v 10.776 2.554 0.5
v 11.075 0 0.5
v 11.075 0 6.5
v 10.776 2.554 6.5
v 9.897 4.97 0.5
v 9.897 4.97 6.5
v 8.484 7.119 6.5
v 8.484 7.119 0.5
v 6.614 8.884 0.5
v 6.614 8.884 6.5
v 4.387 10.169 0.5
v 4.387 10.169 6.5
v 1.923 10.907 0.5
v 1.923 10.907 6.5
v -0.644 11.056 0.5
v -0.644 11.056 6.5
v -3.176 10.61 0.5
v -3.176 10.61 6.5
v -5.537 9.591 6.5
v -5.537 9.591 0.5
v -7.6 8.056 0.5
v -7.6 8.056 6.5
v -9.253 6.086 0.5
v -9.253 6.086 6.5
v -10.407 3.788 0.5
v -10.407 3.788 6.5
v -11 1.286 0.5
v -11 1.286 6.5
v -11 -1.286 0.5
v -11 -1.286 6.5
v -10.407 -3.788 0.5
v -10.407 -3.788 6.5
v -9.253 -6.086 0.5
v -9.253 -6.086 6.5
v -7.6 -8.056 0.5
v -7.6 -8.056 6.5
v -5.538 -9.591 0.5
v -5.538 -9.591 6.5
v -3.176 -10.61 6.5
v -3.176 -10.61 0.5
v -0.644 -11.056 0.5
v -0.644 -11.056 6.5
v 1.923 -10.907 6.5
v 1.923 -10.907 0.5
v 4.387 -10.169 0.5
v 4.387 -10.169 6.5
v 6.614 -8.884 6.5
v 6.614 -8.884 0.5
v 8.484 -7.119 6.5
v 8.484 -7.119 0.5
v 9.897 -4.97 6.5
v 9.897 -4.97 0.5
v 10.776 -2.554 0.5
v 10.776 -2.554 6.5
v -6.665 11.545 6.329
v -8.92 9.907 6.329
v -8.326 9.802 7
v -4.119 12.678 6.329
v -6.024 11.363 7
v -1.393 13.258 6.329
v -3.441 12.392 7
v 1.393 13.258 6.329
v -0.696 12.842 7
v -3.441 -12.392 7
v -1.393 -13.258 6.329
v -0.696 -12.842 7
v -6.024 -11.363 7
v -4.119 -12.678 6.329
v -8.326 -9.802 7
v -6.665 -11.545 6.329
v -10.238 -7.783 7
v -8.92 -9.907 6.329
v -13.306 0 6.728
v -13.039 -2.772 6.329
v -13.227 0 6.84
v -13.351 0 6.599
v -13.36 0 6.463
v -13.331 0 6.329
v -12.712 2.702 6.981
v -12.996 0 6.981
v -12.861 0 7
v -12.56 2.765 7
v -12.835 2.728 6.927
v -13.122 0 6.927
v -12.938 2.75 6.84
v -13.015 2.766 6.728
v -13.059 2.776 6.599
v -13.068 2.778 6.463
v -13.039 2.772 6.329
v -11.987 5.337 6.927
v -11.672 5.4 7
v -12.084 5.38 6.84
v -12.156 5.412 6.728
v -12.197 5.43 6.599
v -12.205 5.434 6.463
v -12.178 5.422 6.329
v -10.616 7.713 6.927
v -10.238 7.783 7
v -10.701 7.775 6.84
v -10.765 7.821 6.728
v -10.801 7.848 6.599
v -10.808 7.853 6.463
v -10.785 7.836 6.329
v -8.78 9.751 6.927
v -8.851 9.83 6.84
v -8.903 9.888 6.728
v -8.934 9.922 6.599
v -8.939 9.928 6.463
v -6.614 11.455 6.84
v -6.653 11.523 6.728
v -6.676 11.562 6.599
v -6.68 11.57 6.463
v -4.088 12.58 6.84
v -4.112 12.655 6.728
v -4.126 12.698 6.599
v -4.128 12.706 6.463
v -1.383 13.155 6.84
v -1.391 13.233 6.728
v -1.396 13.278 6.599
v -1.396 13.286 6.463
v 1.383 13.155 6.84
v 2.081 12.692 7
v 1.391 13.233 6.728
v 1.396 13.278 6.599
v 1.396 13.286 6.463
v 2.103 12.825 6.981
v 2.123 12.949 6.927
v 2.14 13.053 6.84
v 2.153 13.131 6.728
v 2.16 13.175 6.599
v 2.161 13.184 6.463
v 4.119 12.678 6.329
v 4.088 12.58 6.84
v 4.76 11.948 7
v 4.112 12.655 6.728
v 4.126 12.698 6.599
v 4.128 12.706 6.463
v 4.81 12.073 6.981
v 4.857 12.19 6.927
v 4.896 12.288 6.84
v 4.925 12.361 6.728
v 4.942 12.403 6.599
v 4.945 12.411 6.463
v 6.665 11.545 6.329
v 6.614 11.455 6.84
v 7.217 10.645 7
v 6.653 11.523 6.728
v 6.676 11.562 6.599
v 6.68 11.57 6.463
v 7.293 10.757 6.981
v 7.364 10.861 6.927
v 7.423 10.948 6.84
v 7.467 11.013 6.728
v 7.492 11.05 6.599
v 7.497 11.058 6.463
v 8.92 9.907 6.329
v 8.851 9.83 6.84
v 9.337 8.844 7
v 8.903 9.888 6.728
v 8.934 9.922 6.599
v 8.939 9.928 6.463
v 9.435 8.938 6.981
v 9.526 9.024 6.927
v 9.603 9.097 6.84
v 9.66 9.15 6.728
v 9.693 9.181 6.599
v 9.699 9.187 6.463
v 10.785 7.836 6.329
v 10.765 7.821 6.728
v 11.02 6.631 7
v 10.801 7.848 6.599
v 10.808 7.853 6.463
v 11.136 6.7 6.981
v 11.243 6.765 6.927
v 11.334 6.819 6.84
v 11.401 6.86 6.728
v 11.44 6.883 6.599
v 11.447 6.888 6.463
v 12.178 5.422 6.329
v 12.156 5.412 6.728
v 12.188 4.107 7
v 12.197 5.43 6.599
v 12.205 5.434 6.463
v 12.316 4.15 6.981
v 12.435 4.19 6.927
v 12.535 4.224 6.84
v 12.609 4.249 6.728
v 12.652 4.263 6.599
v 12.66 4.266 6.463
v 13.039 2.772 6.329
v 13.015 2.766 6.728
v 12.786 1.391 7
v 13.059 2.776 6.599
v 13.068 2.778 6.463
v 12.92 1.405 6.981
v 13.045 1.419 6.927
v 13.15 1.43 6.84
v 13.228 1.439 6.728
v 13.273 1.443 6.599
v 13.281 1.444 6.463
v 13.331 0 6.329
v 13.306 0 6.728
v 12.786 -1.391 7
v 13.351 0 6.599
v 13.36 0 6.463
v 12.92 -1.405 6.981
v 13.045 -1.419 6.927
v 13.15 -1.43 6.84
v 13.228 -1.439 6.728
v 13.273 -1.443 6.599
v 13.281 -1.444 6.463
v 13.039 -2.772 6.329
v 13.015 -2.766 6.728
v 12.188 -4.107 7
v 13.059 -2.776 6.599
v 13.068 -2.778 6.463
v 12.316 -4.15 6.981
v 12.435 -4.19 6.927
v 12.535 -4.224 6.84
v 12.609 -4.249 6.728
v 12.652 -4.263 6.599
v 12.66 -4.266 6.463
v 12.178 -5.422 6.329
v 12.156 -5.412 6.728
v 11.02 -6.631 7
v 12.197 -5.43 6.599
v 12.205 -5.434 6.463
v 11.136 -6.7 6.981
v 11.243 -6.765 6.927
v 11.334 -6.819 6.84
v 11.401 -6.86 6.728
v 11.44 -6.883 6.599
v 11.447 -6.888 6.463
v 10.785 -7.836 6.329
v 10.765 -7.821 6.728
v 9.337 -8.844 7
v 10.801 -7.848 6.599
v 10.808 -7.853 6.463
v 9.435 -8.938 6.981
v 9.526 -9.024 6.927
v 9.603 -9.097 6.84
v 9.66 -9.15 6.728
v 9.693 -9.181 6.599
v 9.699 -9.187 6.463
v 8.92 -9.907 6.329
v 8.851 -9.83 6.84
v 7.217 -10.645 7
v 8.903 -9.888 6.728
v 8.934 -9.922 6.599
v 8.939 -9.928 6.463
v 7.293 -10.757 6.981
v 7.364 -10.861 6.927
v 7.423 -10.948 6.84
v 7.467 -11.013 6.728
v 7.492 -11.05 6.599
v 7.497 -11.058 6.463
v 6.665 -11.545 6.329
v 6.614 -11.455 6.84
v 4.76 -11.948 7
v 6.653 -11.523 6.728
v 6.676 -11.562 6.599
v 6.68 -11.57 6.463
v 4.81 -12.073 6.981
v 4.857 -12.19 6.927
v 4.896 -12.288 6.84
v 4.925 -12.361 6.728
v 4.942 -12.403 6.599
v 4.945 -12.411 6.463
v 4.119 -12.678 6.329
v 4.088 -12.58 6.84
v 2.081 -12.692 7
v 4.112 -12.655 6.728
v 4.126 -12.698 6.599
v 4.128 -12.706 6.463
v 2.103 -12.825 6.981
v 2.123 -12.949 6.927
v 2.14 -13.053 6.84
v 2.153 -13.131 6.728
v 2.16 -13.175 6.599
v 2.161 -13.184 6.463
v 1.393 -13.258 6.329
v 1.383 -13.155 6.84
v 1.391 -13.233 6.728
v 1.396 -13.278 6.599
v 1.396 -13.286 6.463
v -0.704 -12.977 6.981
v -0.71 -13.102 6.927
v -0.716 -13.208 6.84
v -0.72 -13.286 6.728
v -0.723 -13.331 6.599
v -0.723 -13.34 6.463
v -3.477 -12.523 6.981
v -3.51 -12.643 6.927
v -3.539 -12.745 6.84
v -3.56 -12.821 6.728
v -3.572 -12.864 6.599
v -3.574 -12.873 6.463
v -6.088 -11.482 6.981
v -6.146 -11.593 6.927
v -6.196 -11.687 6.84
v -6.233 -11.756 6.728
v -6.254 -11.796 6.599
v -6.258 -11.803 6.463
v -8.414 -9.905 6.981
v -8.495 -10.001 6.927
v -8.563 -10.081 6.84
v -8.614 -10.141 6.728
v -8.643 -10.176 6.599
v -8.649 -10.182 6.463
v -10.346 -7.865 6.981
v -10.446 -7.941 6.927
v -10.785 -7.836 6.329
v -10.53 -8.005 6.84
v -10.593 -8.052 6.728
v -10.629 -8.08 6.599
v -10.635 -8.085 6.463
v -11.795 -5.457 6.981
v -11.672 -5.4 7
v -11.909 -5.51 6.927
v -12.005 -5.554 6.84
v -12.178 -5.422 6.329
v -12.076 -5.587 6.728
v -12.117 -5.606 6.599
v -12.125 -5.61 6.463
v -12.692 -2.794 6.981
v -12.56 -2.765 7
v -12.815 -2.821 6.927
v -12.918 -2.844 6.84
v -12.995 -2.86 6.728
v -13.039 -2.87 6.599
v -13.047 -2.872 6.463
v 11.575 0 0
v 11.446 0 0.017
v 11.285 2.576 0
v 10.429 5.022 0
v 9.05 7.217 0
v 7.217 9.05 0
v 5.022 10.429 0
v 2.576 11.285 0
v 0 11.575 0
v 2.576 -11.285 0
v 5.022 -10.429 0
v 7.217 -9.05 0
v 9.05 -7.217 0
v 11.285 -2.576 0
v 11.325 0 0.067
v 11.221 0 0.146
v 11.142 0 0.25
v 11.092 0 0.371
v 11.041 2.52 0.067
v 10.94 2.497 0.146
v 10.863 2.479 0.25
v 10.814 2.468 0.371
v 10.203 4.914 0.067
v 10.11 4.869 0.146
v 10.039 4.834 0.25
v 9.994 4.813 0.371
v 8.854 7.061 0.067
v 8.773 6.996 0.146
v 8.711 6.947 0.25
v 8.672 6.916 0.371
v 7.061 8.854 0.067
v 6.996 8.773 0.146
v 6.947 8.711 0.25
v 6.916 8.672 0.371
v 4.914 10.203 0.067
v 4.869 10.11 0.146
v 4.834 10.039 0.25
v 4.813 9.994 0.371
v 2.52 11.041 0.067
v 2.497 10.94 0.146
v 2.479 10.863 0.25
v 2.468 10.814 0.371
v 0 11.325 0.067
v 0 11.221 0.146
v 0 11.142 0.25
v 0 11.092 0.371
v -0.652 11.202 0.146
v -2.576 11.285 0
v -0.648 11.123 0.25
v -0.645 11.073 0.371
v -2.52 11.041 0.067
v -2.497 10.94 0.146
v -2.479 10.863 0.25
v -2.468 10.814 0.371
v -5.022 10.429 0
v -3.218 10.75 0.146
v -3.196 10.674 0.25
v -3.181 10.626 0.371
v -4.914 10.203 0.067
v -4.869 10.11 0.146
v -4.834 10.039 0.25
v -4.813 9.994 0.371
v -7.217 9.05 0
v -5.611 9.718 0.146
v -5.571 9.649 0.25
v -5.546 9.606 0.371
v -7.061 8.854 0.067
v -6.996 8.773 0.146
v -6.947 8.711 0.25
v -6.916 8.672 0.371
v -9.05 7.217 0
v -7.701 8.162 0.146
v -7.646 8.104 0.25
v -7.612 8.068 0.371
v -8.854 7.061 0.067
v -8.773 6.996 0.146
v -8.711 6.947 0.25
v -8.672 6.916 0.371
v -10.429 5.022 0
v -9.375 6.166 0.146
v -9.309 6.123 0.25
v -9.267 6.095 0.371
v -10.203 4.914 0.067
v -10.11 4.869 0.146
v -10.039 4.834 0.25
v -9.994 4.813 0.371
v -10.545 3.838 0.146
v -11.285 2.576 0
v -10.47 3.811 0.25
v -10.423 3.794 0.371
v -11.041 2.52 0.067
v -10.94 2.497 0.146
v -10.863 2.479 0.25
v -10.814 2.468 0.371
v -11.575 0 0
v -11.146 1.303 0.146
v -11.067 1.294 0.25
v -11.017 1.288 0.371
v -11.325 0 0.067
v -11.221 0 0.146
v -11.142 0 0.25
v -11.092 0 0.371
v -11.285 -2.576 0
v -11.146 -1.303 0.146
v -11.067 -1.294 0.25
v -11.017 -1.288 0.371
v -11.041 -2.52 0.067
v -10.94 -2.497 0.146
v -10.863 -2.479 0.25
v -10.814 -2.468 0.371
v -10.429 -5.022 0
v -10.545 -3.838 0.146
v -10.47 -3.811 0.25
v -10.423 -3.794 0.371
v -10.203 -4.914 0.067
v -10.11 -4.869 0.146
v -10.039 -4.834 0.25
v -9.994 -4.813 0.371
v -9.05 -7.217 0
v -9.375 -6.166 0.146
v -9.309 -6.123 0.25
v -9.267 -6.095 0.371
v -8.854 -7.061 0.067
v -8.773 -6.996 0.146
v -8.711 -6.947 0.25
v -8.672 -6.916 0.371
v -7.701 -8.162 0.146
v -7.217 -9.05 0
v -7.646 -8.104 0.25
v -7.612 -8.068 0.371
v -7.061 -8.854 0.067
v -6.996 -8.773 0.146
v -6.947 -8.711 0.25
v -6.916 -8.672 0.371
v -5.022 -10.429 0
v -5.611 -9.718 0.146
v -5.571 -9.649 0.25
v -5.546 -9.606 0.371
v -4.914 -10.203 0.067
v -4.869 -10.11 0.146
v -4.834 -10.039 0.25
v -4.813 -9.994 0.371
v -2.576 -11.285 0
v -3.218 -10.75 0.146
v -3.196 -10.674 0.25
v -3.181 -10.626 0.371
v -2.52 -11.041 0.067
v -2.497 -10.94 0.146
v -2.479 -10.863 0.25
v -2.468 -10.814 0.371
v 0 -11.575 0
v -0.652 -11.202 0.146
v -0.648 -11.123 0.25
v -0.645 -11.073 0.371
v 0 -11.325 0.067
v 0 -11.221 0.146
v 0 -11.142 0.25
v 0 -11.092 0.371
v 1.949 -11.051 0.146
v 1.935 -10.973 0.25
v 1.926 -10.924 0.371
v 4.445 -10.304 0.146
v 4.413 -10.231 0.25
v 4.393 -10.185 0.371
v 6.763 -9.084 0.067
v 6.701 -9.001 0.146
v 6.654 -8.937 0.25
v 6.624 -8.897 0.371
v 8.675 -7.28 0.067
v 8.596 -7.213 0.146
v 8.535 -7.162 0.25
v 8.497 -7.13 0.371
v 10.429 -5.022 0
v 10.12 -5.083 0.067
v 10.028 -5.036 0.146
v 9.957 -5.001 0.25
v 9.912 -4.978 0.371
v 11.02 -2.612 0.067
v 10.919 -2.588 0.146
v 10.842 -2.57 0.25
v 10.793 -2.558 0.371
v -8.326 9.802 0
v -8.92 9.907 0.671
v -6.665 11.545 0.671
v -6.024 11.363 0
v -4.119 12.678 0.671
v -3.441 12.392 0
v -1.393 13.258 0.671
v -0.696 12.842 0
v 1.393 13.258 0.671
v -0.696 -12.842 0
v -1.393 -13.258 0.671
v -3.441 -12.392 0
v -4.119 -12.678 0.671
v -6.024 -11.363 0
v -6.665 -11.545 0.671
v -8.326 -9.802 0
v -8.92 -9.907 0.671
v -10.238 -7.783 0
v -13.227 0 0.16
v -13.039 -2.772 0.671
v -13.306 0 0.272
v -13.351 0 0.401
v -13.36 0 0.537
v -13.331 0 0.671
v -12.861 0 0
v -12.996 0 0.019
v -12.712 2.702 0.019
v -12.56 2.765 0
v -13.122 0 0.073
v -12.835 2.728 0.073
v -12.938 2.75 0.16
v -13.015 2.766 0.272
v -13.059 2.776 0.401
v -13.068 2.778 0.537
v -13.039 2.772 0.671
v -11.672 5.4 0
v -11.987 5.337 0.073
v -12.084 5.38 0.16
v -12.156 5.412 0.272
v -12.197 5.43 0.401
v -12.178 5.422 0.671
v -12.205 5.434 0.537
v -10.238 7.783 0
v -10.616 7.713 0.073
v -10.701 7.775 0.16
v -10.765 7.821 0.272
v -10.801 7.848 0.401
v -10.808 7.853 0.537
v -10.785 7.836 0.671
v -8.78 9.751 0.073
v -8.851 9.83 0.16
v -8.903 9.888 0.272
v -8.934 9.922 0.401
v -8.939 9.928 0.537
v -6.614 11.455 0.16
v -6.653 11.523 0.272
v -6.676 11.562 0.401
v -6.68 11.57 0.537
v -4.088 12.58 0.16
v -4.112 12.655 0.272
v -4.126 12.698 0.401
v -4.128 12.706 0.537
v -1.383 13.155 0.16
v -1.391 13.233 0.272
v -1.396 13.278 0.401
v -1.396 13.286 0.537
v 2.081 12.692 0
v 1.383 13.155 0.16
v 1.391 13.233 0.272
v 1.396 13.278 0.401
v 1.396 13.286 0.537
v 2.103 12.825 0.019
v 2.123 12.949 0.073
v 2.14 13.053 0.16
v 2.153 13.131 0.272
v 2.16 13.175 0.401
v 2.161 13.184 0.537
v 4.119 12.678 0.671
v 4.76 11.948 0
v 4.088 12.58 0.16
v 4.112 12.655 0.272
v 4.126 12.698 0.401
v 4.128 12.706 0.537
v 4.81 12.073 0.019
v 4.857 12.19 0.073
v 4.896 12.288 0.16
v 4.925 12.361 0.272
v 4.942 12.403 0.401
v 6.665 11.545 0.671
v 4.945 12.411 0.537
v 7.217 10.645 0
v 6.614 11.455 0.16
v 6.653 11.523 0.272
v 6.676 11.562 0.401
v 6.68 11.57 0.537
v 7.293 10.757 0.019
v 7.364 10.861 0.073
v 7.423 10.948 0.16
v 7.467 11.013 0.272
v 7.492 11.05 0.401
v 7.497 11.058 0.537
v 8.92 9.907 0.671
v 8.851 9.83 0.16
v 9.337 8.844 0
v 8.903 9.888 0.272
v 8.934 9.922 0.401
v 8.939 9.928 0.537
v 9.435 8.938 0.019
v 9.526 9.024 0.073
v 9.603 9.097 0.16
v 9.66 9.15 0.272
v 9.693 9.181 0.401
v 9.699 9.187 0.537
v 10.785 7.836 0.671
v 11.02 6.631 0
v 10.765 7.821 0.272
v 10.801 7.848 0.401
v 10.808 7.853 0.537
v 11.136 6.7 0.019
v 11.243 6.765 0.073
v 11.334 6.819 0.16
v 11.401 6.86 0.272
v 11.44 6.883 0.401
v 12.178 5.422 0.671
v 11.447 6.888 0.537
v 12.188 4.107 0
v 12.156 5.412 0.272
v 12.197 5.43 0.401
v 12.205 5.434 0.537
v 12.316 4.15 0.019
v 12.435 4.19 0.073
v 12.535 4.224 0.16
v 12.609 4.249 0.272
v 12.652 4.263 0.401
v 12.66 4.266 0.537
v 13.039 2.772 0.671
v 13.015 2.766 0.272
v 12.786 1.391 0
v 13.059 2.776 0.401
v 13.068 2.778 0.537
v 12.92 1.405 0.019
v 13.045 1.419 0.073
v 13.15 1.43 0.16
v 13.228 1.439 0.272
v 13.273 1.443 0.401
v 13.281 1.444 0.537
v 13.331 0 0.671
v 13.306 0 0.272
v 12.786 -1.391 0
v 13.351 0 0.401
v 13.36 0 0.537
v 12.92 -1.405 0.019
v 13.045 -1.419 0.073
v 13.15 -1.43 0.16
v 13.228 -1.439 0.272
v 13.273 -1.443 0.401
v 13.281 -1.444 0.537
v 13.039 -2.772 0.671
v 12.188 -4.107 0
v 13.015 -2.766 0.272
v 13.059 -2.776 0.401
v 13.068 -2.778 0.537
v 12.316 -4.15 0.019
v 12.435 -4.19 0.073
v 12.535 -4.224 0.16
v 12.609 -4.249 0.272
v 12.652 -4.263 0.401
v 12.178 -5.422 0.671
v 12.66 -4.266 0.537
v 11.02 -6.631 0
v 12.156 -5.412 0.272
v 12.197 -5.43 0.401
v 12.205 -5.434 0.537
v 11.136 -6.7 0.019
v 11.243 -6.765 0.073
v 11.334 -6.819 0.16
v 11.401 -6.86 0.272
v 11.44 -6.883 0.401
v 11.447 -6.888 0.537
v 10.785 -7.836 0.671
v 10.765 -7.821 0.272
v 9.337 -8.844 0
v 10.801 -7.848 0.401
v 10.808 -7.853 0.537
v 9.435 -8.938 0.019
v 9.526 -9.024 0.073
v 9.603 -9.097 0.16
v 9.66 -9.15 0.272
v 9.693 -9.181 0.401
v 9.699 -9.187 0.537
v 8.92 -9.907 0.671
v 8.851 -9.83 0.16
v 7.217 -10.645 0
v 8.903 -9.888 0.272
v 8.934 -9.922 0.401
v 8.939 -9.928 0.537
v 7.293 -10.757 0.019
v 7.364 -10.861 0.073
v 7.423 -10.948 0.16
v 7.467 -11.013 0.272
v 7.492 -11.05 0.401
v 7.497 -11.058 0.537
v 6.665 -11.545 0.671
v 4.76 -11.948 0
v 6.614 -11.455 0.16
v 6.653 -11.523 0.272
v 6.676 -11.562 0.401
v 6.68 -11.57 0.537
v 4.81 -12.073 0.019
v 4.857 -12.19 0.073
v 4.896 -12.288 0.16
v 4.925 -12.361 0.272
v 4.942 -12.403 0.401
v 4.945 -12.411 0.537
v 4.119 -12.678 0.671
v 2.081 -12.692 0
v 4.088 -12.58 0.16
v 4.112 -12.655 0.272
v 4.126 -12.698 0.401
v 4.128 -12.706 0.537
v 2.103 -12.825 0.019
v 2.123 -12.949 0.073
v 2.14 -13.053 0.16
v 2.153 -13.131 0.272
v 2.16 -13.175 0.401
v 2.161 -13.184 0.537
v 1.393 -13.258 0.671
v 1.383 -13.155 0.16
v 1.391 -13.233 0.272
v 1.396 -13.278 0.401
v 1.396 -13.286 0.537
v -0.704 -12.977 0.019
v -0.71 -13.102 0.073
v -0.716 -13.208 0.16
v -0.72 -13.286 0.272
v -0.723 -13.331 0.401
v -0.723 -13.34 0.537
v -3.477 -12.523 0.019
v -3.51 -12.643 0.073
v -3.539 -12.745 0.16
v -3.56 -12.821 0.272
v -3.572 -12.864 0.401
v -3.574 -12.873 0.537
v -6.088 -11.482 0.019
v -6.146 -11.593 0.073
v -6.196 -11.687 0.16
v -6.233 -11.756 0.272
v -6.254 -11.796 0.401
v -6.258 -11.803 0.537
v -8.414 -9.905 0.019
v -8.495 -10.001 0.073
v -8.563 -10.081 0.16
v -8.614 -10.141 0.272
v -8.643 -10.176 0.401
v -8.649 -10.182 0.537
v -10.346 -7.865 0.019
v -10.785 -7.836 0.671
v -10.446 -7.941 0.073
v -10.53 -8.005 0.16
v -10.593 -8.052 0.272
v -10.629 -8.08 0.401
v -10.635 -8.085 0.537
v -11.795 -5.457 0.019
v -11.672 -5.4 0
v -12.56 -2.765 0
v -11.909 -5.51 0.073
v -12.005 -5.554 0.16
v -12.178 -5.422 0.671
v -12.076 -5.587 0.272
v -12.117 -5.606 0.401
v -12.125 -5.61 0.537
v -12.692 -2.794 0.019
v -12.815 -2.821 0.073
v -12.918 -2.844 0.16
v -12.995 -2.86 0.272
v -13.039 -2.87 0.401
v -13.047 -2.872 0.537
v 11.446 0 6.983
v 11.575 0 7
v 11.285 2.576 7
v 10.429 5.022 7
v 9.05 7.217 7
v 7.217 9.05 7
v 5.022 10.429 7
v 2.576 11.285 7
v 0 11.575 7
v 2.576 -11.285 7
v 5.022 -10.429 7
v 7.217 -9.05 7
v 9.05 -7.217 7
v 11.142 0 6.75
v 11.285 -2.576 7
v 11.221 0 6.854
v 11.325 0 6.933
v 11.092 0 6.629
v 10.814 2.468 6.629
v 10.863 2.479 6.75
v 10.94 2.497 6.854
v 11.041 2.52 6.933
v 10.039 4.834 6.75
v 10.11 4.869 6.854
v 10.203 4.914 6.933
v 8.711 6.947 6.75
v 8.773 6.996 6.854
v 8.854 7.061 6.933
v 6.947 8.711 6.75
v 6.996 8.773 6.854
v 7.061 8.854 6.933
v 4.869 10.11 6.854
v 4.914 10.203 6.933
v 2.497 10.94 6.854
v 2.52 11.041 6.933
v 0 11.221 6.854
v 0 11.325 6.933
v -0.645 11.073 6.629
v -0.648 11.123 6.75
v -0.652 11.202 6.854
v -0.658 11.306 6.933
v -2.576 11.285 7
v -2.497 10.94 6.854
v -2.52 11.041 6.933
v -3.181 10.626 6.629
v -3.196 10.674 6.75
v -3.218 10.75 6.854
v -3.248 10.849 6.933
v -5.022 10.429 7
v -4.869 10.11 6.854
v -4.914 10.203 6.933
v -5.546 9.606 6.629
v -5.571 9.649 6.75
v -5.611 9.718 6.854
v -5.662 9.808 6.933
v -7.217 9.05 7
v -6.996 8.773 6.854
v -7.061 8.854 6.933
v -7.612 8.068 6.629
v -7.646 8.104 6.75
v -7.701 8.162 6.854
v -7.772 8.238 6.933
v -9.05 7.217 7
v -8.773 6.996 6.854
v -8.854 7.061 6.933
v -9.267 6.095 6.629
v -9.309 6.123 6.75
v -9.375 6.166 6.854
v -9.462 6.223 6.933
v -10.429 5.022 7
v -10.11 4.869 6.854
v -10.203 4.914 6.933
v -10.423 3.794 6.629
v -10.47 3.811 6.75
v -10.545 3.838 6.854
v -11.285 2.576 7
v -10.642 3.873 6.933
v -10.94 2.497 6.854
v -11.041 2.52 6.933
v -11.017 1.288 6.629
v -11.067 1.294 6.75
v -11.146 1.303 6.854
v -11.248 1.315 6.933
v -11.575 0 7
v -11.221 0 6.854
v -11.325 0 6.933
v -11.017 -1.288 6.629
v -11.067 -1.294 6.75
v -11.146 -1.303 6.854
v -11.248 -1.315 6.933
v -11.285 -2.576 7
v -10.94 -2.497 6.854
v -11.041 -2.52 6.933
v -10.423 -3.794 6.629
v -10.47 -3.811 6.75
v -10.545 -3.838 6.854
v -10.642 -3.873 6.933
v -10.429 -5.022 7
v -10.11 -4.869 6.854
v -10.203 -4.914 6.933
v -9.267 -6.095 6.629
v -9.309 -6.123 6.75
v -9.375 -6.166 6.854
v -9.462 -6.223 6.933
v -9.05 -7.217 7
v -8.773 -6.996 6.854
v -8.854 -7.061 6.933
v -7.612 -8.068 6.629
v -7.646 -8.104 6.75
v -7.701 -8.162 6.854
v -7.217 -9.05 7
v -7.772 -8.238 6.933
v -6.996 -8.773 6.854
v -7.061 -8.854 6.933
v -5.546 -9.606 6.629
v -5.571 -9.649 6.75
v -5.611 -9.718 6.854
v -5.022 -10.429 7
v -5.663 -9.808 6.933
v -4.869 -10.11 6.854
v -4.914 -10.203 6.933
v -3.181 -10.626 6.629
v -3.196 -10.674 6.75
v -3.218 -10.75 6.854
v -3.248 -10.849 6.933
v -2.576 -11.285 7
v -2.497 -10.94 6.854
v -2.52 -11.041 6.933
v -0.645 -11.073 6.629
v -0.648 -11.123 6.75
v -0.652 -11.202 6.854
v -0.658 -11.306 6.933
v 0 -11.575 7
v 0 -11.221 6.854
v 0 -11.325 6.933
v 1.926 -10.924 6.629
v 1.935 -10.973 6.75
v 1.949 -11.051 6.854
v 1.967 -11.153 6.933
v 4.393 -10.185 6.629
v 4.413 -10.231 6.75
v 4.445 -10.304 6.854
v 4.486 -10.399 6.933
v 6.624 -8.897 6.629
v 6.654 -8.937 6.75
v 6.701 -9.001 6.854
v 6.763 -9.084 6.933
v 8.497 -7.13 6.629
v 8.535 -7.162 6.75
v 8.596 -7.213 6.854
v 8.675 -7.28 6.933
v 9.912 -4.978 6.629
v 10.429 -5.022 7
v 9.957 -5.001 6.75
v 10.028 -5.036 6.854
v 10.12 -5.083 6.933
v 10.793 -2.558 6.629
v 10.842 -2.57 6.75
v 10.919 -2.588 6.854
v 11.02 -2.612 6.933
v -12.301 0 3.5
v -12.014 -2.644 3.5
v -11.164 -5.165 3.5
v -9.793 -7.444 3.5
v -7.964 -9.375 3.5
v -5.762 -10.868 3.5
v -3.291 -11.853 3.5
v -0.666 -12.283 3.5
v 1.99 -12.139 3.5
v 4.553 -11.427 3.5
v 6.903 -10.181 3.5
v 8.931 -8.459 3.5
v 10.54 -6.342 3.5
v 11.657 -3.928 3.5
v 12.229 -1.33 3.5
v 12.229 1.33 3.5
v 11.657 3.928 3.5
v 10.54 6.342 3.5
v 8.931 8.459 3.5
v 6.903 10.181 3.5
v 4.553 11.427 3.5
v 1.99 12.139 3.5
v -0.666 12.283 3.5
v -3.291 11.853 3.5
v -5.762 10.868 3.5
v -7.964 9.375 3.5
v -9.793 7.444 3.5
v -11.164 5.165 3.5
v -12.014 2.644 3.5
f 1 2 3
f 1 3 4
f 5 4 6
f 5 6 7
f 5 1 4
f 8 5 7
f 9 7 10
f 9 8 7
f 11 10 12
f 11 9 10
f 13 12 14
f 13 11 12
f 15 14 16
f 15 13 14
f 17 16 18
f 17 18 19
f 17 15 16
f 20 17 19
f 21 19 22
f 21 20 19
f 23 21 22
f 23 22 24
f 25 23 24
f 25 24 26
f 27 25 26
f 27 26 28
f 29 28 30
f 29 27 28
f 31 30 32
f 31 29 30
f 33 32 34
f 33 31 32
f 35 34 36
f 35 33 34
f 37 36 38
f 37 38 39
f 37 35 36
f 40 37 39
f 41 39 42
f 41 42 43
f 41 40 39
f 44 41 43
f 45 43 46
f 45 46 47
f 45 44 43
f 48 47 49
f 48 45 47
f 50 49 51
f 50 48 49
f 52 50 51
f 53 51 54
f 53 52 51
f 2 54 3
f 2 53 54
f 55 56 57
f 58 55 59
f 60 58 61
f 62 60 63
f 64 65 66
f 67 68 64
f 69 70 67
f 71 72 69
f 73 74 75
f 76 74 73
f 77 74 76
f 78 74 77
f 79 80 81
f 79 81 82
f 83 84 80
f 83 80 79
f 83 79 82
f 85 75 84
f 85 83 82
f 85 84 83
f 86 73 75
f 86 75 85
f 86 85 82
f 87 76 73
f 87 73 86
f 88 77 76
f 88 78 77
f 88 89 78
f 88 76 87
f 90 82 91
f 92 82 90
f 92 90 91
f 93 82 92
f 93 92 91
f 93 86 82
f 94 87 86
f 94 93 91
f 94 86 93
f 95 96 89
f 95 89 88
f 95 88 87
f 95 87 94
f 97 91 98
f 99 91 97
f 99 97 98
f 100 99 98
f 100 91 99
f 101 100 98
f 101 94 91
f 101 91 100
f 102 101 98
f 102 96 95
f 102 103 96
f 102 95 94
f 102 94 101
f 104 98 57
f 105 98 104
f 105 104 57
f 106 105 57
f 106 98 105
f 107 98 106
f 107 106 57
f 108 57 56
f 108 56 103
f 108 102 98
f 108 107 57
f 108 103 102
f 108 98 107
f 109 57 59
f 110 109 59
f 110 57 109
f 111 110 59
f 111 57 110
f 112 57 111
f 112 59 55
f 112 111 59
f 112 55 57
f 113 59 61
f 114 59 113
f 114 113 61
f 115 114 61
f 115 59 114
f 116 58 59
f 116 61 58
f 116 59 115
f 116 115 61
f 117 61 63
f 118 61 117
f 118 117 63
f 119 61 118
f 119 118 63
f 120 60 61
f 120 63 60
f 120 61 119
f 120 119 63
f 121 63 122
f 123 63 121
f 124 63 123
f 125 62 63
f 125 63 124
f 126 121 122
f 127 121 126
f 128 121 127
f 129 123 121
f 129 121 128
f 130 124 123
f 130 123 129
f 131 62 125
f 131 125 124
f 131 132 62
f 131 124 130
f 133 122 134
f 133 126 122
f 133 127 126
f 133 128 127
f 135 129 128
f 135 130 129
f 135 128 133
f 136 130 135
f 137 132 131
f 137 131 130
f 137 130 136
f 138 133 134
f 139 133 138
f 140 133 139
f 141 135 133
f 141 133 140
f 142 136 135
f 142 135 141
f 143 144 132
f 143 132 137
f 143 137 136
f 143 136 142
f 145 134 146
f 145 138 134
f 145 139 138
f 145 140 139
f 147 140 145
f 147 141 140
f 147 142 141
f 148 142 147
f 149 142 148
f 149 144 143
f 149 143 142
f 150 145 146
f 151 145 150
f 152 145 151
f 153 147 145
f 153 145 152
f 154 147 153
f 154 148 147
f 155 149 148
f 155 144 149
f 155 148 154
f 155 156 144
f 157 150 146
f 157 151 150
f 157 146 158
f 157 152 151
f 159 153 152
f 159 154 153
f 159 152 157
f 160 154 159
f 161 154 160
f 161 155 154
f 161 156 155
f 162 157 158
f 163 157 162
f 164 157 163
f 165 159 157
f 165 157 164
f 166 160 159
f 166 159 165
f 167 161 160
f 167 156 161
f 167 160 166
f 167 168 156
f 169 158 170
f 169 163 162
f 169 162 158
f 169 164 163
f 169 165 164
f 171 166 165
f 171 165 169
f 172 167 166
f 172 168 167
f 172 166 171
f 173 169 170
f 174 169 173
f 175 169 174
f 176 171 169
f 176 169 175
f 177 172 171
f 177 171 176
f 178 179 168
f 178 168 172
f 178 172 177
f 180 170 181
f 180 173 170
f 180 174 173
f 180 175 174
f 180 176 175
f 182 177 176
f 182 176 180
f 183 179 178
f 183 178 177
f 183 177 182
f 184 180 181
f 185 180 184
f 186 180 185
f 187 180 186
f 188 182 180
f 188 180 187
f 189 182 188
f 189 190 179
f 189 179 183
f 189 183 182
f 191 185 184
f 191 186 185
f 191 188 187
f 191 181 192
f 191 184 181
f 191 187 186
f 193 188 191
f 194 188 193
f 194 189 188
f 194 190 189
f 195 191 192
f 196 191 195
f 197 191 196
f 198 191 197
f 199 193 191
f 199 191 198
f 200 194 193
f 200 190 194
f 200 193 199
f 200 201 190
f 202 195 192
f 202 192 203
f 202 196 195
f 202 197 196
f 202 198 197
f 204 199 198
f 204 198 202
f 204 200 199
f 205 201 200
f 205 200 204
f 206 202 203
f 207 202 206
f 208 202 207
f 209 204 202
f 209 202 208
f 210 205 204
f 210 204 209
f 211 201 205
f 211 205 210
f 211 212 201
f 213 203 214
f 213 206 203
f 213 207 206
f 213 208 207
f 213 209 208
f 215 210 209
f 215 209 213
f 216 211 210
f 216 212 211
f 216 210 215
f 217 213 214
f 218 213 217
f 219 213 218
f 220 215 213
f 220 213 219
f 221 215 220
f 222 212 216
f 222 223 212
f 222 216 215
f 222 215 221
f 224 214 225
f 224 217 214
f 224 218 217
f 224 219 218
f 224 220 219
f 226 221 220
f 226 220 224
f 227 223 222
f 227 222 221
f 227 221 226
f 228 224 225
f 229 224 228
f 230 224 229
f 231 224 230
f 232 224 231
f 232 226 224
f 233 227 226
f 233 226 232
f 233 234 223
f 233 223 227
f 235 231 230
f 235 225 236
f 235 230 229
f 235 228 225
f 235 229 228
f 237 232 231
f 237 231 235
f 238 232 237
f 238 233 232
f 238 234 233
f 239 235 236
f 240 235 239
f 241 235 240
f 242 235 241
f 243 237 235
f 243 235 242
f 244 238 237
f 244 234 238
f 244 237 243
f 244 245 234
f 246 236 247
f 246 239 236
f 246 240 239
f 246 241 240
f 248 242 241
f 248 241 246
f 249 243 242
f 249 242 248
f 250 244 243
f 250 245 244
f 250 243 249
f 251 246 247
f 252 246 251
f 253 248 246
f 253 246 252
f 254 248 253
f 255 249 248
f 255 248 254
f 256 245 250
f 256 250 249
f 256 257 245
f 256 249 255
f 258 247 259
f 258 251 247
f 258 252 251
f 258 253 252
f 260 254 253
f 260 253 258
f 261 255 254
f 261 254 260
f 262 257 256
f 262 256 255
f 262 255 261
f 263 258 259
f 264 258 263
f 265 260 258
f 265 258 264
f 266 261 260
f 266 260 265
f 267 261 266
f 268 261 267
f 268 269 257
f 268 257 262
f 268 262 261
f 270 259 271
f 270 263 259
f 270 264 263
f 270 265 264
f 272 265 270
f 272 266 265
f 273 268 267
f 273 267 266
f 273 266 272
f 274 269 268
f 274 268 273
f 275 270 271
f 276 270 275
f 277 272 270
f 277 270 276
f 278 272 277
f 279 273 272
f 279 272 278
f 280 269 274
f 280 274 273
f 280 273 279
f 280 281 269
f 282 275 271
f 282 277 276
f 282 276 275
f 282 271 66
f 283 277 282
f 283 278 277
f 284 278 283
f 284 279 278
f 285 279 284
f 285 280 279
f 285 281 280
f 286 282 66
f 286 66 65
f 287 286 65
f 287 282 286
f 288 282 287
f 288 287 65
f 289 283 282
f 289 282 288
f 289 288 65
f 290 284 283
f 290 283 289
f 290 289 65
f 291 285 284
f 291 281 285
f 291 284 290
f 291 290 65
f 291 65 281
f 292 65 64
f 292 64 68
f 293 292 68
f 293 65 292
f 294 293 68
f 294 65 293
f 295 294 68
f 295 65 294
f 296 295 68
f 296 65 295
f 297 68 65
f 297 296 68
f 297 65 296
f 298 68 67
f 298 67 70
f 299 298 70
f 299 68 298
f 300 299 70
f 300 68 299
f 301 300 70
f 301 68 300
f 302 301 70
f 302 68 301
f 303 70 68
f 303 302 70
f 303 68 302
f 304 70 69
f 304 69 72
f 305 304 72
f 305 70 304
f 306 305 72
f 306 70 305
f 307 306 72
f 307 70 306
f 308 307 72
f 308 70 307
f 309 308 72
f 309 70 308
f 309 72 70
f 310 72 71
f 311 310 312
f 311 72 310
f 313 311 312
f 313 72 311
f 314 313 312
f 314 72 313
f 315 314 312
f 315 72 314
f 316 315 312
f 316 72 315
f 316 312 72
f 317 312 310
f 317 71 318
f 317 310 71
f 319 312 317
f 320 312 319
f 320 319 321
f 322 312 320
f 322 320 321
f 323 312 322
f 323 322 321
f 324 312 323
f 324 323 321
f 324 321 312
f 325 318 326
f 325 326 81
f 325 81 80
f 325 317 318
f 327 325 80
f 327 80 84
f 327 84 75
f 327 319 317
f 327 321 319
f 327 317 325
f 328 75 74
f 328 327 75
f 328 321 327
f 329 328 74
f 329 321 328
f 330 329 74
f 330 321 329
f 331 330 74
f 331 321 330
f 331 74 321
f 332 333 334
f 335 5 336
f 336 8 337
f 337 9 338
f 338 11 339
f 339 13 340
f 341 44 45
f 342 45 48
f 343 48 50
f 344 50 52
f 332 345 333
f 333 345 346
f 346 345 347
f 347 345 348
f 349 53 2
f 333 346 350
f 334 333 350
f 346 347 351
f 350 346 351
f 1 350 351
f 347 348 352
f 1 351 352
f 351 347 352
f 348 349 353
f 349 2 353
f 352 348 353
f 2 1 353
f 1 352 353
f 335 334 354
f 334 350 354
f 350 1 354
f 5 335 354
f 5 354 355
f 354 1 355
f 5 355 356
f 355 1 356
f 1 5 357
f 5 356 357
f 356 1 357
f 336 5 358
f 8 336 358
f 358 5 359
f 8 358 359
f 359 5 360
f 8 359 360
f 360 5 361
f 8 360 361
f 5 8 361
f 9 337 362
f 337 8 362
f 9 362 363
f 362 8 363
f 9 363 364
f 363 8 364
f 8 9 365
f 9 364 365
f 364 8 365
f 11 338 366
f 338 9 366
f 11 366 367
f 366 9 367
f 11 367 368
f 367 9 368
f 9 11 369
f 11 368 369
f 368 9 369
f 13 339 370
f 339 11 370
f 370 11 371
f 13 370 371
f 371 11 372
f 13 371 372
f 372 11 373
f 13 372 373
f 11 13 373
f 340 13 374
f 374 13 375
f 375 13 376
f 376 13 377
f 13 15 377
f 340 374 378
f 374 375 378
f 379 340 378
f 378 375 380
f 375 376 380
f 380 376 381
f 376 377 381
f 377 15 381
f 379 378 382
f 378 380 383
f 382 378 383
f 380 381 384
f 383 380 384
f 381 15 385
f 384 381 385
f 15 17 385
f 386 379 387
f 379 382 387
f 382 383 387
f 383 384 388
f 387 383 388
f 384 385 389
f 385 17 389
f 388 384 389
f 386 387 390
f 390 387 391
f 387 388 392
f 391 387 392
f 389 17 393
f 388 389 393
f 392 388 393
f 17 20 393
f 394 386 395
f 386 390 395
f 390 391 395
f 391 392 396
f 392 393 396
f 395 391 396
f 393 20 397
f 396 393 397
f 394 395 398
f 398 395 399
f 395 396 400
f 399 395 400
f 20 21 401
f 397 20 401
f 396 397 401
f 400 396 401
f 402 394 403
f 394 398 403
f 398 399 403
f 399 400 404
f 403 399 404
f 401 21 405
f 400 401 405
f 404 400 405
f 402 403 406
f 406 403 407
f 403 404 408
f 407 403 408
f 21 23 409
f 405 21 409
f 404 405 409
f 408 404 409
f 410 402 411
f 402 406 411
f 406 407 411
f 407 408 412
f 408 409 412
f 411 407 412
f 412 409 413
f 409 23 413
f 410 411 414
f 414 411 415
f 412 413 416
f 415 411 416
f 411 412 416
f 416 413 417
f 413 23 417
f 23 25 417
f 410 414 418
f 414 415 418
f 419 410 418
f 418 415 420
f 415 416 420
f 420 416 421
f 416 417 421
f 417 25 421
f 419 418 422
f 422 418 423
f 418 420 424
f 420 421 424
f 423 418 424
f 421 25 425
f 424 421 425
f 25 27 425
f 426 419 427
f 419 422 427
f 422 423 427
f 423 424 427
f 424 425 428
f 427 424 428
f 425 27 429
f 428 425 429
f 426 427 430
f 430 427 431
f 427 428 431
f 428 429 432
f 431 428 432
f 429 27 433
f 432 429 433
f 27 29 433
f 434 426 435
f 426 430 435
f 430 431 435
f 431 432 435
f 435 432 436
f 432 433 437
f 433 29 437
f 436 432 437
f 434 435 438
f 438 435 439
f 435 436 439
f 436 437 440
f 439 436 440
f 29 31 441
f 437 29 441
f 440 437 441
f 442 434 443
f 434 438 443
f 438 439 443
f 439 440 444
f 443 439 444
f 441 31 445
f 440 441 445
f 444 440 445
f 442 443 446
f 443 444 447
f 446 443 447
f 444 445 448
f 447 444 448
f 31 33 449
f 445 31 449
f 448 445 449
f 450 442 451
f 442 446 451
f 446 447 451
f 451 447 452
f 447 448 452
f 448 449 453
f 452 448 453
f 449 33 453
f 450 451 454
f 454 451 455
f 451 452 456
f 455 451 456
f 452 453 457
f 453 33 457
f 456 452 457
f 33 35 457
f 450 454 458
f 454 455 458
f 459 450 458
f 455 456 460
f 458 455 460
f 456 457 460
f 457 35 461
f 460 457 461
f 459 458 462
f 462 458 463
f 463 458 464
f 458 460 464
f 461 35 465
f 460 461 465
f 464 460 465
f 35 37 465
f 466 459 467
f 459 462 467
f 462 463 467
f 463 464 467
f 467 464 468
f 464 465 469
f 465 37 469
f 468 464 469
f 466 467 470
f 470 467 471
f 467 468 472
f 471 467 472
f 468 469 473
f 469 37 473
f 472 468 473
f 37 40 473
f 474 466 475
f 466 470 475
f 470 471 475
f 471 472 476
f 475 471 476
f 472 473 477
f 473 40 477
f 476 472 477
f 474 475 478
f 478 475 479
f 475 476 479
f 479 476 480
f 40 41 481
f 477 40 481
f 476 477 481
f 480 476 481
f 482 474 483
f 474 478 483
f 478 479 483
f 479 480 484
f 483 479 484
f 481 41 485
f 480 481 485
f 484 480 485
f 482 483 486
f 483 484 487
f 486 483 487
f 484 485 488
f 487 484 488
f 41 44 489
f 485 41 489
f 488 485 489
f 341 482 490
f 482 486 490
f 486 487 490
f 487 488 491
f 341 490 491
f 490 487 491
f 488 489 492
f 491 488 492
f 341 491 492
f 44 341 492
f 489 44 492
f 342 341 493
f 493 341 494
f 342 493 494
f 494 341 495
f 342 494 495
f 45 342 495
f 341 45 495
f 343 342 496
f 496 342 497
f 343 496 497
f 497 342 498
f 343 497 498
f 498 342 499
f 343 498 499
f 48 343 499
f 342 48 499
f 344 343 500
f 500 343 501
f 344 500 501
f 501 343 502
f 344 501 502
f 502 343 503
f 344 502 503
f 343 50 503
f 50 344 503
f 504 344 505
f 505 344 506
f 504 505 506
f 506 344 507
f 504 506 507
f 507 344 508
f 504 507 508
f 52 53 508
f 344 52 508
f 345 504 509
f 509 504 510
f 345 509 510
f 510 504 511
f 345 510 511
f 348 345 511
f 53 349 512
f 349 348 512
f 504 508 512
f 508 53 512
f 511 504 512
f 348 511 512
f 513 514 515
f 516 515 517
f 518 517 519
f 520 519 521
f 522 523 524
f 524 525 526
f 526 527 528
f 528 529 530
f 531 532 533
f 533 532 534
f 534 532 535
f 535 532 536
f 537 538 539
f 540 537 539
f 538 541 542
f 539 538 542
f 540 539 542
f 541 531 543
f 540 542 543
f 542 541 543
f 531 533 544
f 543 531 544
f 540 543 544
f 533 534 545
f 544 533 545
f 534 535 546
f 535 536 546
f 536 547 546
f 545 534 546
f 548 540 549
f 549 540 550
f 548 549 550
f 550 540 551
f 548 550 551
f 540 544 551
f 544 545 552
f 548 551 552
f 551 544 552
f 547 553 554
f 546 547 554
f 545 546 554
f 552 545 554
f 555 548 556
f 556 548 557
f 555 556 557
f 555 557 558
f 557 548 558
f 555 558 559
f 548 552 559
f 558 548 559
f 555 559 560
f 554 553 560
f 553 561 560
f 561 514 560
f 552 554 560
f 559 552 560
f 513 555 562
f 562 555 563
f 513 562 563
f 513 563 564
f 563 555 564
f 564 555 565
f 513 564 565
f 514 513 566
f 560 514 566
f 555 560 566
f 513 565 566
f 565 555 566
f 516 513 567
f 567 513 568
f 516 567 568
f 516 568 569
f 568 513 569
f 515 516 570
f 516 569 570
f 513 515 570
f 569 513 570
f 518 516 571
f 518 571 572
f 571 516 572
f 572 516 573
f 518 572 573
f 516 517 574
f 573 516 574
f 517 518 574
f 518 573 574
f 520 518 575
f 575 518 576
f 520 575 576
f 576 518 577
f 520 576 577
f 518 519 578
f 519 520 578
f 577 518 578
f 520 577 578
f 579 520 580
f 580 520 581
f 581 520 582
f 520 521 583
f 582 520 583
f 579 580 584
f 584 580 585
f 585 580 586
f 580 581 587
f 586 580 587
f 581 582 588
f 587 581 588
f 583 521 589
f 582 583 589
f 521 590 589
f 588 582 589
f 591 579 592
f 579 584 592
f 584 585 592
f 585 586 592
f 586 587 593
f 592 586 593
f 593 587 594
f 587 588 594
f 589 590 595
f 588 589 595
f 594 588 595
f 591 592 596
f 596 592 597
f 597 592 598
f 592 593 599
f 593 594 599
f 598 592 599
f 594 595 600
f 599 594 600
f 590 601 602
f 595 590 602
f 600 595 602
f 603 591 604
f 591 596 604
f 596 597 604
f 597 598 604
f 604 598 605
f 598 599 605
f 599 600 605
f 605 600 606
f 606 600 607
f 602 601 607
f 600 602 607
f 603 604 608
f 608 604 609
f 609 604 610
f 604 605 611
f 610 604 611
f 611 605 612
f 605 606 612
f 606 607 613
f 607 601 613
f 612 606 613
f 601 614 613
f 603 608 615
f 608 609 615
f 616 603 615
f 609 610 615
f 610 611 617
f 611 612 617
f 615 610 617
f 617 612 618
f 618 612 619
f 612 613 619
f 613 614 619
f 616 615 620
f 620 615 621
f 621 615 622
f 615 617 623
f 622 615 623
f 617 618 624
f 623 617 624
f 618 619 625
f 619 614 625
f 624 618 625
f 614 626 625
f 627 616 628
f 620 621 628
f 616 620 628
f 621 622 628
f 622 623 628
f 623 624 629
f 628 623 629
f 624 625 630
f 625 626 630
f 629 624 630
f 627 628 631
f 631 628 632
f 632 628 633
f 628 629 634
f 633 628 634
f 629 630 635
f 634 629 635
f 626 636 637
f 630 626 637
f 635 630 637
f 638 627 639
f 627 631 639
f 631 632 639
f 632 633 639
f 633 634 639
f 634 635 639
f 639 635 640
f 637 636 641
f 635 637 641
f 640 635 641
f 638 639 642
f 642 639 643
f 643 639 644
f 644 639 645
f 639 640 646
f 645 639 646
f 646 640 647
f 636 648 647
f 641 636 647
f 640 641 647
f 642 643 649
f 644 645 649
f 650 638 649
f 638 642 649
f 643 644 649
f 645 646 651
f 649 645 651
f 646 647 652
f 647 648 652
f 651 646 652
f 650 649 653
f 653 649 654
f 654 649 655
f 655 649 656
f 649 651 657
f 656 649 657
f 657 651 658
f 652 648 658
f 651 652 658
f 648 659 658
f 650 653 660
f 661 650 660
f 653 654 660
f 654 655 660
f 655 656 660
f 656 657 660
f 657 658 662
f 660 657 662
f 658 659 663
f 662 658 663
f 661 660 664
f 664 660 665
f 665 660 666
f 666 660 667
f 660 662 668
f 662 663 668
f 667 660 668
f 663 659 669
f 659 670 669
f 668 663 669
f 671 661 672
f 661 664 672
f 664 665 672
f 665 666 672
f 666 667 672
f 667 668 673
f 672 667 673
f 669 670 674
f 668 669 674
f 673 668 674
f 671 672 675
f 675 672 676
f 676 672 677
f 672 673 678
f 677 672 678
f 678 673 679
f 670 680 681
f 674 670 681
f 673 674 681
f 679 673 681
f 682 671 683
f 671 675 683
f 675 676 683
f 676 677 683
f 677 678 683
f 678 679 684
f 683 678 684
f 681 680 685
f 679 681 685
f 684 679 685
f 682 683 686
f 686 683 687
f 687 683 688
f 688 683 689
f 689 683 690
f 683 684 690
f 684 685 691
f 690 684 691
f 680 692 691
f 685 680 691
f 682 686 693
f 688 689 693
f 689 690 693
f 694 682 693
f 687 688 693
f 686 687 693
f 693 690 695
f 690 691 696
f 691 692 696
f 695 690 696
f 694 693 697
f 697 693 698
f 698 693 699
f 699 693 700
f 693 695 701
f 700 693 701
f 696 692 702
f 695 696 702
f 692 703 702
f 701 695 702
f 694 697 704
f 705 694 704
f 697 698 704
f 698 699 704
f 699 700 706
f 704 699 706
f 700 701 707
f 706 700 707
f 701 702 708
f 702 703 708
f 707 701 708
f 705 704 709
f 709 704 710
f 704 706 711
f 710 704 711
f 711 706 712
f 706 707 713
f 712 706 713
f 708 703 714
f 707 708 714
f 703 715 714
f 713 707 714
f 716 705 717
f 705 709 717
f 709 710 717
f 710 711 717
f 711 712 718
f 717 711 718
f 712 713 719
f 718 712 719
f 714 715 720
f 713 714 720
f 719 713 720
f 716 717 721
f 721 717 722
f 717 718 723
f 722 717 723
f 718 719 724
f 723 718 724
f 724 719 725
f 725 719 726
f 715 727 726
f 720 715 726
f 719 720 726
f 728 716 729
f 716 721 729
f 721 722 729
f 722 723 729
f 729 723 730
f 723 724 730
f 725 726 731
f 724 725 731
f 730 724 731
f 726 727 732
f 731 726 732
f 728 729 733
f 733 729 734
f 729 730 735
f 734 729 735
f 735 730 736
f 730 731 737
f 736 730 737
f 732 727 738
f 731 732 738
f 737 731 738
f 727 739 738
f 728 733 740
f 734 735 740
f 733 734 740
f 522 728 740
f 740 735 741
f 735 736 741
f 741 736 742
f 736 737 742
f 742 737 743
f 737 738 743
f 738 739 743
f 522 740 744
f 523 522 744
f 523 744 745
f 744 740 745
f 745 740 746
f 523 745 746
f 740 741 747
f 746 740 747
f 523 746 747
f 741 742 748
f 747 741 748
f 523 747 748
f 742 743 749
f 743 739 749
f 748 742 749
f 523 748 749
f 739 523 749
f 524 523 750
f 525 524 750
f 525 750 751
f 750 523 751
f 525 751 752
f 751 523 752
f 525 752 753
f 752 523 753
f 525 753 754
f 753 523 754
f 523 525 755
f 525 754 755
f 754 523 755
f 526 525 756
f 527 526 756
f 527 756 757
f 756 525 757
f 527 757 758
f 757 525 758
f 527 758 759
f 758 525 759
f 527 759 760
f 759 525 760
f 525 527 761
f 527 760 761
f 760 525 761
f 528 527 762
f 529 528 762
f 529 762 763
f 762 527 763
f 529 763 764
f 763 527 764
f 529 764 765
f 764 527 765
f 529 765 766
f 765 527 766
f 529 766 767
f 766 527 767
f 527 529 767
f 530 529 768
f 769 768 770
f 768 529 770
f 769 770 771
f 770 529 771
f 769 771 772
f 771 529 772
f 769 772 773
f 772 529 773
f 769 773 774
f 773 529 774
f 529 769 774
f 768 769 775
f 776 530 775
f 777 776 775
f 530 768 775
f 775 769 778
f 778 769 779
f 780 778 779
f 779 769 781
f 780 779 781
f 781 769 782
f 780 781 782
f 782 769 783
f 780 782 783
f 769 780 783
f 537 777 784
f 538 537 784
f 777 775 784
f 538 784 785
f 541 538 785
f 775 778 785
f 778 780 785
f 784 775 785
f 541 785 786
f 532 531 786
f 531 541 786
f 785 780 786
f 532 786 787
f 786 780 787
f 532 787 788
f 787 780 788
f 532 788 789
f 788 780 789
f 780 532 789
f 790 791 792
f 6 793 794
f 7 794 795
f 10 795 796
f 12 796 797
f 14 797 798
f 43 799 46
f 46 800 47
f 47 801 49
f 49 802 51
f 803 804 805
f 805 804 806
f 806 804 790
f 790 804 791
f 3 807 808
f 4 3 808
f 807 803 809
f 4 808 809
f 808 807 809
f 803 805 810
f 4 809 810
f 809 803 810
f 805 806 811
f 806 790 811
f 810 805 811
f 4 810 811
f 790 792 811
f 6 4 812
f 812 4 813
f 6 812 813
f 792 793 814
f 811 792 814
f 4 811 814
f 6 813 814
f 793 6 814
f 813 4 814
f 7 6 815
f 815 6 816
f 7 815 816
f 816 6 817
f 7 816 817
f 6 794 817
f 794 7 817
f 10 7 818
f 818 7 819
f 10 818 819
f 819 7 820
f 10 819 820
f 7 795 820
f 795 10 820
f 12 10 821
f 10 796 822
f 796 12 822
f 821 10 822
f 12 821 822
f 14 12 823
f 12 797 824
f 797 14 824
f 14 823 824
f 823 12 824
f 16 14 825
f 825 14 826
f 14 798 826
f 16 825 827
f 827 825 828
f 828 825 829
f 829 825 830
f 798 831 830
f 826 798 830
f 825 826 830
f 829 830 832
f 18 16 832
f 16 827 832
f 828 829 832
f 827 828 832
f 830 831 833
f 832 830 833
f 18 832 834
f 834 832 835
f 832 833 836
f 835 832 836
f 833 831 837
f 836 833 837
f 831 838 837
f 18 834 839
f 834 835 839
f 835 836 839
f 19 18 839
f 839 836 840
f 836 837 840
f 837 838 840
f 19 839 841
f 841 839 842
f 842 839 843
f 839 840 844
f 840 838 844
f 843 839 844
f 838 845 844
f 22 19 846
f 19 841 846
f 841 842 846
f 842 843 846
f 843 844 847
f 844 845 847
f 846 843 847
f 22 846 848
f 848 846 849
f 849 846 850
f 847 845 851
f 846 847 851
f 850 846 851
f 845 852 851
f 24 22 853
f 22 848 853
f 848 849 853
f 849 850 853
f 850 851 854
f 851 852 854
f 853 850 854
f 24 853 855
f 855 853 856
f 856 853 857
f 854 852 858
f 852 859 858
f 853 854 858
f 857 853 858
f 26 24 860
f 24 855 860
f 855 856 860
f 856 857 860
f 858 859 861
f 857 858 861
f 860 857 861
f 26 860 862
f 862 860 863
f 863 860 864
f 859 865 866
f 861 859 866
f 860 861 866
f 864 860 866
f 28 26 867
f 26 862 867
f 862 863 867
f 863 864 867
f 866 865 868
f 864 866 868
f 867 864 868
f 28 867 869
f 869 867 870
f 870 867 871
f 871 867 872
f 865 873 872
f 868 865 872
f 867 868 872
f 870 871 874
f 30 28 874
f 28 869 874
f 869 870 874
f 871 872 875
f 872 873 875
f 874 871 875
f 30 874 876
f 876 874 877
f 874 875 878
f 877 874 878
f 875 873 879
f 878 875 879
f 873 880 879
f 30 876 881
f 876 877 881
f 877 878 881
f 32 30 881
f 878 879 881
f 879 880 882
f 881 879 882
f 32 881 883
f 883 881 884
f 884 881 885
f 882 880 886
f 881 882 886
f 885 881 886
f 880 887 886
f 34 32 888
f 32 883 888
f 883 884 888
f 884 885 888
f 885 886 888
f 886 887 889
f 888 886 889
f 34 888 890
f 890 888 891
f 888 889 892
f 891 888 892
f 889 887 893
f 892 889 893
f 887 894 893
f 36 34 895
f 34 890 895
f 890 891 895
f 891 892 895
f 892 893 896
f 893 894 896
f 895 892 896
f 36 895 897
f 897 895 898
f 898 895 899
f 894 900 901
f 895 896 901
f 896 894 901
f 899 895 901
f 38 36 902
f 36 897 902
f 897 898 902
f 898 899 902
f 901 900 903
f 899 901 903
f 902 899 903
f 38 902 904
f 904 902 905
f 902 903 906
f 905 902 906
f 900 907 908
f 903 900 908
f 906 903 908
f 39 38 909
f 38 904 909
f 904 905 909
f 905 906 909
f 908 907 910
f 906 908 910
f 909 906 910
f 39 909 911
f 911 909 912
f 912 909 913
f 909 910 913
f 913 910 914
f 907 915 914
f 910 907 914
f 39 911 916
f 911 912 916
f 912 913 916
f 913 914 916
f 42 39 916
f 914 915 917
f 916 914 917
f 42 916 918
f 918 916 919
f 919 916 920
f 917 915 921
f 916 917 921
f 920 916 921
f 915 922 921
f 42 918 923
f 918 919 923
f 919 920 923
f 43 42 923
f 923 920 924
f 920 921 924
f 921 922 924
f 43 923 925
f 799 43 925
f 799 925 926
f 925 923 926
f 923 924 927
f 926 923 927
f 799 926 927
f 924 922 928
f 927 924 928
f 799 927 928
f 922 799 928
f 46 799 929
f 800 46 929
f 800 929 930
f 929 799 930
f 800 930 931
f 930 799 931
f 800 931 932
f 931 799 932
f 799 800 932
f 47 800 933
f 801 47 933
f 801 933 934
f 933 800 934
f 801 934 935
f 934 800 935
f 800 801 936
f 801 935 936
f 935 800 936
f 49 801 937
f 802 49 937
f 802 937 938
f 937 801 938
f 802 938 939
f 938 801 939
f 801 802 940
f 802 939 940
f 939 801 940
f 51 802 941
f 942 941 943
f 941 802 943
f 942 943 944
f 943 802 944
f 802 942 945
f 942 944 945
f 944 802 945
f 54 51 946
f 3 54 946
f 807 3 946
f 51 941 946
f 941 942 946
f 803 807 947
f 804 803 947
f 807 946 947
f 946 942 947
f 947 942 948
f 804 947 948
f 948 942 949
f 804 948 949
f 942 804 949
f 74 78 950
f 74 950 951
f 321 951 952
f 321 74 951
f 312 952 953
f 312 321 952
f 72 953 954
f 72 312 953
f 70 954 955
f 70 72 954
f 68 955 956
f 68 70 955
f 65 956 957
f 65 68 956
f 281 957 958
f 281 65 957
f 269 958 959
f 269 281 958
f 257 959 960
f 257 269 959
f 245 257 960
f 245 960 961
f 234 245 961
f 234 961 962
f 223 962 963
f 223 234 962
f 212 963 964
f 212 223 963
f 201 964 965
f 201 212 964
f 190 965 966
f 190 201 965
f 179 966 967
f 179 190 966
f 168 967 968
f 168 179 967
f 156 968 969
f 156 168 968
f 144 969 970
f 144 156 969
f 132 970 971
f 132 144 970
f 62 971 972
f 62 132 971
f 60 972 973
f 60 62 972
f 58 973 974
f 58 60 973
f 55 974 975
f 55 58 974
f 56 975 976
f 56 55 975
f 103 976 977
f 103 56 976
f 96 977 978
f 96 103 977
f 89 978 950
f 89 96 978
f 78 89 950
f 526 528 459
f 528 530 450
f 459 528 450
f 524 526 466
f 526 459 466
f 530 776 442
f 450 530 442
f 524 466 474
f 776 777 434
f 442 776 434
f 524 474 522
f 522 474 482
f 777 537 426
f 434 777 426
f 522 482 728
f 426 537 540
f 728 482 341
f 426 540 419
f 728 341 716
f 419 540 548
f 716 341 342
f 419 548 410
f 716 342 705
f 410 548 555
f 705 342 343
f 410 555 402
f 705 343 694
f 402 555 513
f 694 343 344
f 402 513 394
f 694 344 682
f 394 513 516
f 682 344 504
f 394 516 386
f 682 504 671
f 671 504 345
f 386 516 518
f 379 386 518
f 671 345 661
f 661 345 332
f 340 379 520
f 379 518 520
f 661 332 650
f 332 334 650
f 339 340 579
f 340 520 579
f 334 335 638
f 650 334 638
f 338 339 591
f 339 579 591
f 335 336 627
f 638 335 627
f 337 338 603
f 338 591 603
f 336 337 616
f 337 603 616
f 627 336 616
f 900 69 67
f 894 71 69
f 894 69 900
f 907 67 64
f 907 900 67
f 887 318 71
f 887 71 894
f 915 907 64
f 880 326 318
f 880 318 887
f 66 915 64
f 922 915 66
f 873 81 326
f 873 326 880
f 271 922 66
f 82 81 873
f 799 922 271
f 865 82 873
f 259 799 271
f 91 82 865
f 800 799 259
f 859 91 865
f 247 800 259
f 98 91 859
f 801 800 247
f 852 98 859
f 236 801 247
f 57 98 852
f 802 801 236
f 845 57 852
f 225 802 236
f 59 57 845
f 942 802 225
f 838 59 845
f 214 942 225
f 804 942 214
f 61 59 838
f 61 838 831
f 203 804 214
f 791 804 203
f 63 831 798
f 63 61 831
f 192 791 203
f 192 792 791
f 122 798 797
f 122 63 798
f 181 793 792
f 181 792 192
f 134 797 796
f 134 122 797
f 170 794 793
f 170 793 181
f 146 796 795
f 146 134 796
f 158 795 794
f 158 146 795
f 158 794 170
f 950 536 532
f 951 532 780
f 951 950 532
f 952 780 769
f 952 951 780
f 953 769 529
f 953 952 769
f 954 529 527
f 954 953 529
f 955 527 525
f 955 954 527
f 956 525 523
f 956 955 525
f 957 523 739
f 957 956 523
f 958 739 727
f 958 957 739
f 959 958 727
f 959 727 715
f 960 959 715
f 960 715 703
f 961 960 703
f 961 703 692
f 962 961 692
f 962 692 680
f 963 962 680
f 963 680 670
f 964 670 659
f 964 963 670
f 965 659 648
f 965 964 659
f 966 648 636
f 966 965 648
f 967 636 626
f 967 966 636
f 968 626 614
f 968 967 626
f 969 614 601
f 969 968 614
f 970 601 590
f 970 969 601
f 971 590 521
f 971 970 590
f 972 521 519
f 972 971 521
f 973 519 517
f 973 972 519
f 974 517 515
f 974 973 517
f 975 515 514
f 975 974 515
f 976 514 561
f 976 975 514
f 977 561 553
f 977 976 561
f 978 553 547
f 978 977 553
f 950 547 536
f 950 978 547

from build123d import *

# Parameters (mm, degrees)
SKETCH1_R           = 13.575
SKETCH1_R_2         = 11.075
BOSS_EXTRUDE1_DEPTH = 7
FILLET1_R           = 0.5
FILLET2_R           = 0.5


with BuildPart() as part:
    # Sketch1 → Boss-Extrude1 (new body)
    with BuildSketch(Plane.XY):
        Circle(SKETCH1_R)
        Circle(SKETCH1_R_2, mode=Mode.SUBTRACT)
    extrude(amount=BOSS_EXTRUDE1_DEPTH)

    # Sketch2 → Cut-Revolve1 (revolve, cut)
    with BuildSketch(Plane(origin=(0, 0, 0), x_dir=(1, 0, 0), z_dir=(0, 1, 0)), mode=Mode.PRIVATE) as cut_revolve1_sk:
        Polygon((13.575, 0), (12.30110418, -3.5), (13.575, -7), align=None)
    revolve(cut_revolve1_sk.sketch.rotate(Axis((0, 0, 0), (0, 0, 1)), 180), axis=Axis((0, 0, 0), (0, 0, 1)), mode=Mode.SUBTRACT)

    # Fillet1
    fillet1_edges = [part.edges().sort_by_distance(p)[0] for p in [
        (13.575, 0, 7),
        (13.575, 0, 0),
    ]]
    fillet(fillet1_edges, radius=FILLET1_R)

    # Fillet2
    fillet2_edges = [part.edges().sort_by_distance(p)[0] for p in [
        (-11.075, 0, 0),
        (-11.075, 0, 7),
    ]]
    fillet(fillet2_edges, radius=FILLET2_R)


solid = part.part
